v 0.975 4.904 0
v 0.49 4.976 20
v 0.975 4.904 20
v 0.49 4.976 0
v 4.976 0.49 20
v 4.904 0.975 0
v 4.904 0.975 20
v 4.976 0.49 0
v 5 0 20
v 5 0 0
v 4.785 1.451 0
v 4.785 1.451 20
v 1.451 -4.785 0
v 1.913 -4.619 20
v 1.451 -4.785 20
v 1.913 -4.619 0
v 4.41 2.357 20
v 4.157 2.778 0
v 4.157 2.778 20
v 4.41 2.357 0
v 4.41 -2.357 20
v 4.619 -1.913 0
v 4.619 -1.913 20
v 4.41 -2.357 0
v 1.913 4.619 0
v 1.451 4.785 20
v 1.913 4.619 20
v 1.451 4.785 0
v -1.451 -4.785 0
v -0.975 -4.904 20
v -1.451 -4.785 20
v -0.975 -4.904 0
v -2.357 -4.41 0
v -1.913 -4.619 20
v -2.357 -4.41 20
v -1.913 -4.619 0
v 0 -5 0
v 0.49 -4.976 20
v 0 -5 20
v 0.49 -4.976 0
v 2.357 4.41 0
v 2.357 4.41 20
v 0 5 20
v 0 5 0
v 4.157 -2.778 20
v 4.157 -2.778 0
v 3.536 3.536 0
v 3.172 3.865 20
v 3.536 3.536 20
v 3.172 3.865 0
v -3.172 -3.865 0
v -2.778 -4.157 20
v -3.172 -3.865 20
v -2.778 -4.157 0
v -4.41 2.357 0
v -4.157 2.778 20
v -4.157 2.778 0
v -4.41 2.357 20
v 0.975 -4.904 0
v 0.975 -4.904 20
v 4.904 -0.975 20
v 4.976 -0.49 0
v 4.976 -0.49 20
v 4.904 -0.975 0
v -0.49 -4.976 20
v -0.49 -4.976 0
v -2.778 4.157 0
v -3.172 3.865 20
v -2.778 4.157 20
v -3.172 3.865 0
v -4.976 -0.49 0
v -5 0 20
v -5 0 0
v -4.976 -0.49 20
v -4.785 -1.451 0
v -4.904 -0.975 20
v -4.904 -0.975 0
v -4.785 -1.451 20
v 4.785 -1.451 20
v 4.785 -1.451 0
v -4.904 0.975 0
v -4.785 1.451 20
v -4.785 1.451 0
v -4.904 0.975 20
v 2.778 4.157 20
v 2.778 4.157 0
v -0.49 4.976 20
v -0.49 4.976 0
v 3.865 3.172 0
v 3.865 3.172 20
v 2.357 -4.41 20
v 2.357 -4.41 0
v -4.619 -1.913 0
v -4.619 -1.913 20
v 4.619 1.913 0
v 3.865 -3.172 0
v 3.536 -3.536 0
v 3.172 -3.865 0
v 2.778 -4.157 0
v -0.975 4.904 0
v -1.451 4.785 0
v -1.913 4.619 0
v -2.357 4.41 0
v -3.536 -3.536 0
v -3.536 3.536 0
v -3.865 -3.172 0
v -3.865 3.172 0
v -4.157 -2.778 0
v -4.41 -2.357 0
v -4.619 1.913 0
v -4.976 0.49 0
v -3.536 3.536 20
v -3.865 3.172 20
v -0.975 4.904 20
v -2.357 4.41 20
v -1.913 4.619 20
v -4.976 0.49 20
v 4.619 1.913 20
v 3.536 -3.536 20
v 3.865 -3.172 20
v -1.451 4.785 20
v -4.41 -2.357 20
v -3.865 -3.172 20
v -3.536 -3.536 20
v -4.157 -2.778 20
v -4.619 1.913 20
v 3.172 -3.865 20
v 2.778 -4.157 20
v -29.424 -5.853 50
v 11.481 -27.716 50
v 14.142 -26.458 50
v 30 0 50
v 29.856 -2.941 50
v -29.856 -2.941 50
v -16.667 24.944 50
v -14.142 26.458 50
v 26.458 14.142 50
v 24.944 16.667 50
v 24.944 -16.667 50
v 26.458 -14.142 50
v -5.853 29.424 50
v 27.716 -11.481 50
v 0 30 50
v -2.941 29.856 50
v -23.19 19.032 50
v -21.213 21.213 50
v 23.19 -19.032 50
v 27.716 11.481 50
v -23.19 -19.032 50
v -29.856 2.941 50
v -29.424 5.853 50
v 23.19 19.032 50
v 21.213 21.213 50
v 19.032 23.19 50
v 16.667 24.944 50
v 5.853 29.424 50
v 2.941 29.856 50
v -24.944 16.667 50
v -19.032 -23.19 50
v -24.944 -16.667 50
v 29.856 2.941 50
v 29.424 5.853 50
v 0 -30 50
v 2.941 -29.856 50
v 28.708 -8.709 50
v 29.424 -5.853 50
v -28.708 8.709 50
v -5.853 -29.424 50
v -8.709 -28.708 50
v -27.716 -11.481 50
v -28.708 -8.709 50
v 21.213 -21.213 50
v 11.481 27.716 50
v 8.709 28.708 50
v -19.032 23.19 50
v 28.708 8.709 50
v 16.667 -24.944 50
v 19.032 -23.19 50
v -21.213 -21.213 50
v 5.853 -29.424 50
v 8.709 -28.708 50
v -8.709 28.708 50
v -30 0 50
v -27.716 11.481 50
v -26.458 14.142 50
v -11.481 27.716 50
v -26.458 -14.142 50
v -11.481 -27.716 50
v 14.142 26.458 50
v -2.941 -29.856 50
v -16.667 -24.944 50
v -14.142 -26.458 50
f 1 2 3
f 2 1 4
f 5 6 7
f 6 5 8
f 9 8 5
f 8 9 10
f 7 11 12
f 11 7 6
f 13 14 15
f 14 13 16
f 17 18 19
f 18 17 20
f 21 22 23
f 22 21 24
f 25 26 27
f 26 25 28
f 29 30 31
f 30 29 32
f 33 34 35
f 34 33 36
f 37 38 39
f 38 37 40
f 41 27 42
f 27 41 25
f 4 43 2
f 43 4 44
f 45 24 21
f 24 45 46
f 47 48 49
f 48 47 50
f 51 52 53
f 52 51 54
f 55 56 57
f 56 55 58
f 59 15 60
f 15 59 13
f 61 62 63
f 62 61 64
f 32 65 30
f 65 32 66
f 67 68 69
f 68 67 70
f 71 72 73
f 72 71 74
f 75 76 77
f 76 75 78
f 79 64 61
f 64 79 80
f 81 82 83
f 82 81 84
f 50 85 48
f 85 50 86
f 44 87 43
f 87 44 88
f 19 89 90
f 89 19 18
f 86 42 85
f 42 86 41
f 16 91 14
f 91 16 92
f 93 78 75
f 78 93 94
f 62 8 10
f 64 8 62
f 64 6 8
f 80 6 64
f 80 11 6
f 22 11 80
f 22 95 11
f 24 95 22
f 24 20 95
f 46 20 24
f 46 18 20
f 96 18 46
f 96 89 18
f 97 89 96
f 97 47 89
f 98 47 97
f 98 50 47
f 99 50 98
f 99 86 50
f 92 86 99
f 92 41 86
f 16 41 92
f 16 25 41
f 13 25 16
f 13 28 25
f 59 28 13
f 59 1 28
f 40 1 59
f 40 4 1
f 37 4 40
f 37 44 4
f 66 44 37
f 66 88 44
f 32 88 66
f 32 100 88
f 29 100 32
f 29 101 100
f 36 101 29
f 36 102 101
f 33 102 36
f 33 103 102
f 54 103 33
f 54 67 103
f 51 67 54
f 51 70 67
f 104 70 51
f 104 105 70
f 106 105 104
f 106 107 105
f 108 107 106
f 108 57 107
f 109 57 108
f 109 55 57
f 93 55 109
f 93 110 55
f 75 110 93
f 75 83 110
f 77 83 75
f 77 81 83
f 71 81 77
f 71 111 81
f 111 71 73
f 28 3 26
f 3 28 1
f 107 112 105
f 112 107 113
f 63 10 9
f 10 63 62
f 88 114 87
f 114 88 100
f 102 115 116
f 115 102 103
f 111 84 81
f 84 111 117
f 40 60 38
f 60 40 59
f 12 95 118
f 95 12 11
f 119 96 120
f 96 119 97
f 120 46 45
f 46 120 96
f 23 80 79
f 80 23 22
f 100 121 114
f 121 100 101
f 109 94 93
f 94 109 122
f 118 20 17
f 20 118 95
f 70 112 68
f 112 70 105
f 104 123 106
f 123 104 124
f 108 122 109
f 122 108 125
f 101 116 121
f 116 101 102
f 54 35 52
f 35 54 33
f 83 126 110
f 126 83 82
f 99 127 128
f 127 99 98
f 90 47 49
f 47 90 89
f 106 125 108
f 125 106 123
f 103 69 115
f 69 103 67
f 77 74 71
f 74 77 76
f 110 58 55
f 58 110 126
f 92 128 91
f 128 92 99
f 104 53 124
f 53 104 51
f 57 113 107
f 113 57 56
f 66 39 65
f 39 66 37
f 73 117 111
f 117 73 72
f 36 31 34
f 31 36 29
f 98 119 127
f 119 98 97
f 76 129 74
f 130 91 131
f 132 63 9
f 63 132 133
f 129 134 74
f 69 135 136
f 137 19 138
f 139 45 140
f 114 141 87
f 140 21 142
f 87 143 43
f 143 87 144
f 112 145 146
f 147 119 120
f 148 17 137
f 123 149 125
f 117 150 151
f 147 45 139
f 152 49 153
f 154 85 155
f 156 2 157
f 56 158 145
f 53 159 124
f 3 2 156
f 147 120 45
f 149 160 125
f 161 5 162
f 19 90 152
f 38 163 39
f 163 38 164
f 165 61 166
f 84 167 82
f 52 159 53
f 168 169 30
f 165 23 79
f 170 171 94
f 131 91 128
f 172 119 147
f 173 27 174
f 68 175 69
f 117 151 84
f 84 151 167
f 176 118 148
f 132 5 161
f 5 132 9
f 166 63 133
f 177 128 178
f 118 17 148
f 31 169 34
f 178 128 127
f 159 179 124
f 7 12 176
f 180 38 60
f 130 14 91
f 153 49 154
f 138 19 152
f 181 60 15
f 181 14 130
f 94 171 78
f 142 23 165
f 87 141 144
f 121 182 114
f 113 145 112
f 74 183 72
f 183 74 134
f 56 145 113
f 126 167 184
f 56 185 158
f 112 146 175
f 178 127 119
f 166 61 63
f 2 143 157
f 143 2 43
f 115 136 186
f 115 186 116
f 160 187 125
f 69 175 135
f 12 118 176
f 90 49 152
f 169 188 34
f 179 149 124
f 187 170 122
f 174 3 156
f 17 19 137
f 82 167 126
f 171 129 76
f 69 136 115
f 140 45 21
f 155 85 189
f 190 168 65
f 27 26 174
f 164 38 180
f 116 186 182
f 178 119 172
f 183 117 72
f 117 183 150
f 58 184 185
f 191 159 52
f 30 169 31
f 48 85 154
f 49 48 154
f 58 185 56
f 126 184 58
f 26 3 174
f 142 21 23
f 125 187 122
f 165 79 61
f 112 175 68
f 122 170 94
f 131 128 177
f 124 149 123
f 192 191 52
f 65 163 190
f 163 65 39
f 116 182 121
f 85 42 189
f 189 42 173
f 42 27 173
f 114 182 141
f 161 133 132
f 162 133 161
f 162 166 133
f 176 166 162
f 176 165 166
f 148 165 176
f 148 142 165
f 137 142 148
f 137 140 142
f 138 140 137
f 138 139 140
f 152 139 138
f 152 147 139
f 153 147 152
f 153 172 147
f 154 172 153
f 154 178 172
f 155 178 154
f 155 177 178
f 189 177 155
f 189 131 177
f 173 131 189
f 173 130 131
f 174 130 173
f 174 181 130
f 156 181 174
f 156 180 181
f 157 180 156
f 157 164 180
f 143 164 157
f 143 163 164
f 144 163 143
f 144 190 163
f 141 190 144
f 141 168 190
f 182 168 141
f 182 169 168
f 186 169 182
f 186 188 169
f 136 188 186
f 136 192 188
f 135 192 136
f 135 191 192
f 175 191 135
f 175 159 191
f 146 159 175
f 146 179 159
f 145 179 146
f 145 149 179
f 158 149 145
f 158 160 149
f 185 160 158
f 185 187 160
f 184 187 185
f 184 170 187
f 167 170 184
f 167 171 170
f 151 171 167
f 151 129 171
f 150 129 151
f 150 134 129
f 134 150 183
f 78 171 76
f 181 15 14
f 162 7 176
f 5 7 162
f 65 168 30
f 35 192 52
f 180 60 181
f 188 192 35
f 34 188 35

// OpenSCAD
// Lab Funnel Design
// Wall thickness: 1.6 mm
// Spout: 10 mm outer diameter, 20 mm tall (z = 0 to z = 20)
// Cone: expands from 10 mm outer diameter at z = 20 to 60 mm outer diameter at z = 50
// Open at top and bottom for liquid flow

$fn = 64;

// Dimensions
wall_thickness = 1.6;
spout_outer_diameter = 10;
spout_height = 20;
cone_top_diameter = 10;
cone_bottom_diameter = 60;
cone_height = 30; // from z=20 to z=50

// Calculate inner diameters
spout_inner_diameter = spout_outer_diameter - 2 * wall_thickness;
cone_top_inner_diameter = cone_top_diameter - 2 * wall_thickness;
cone_bottom_inner_diameter = cone_bottom_diameter - 2 * wall_thickness;

// Spout (outer cylinder)
module spout_outer() {
    translate([0, 0, 0])
    cylinder(h = spout_height, d = spout_outer_diameter, center = false);
}

// Spout (inner cylinder - for hollowing)
module spout_inner() {
    translate([0, 0, -0.01])
    cylinder(h = spout_height + 0.02, d = spout_inner_diameter, center = false);
}

// Cone (outer cone)
module cone_outer() {
    translate([0, 0, spout_height])
    cylinder(h = cone_height, 
             d1 = cone_top_diameter, 
             d2 = cone_bottom_diameter, 
             center = false);
}

// Cone (inner cone - for hollowing)
module cone_inner() {
    translate([0, 0, spout_height - 0.01])
    cylinder(h = cone_height + 0.02, 
             d1 = cone_top_inner_diameter, 
             d2 = cone_bottom_inner_diameter, 
             center = false);
}

// Build the funnel
module funnel() {
    // Outer shape: spout + cone
    union() {
        spout_outer();
        cone_outer();
    }
    
    // Subtract inner hollow
    difference() {
        union() {
            spout_outer();
            cone_outer();
        }
        spout_inner();
        cone_inner();
    }
}

funnel();
